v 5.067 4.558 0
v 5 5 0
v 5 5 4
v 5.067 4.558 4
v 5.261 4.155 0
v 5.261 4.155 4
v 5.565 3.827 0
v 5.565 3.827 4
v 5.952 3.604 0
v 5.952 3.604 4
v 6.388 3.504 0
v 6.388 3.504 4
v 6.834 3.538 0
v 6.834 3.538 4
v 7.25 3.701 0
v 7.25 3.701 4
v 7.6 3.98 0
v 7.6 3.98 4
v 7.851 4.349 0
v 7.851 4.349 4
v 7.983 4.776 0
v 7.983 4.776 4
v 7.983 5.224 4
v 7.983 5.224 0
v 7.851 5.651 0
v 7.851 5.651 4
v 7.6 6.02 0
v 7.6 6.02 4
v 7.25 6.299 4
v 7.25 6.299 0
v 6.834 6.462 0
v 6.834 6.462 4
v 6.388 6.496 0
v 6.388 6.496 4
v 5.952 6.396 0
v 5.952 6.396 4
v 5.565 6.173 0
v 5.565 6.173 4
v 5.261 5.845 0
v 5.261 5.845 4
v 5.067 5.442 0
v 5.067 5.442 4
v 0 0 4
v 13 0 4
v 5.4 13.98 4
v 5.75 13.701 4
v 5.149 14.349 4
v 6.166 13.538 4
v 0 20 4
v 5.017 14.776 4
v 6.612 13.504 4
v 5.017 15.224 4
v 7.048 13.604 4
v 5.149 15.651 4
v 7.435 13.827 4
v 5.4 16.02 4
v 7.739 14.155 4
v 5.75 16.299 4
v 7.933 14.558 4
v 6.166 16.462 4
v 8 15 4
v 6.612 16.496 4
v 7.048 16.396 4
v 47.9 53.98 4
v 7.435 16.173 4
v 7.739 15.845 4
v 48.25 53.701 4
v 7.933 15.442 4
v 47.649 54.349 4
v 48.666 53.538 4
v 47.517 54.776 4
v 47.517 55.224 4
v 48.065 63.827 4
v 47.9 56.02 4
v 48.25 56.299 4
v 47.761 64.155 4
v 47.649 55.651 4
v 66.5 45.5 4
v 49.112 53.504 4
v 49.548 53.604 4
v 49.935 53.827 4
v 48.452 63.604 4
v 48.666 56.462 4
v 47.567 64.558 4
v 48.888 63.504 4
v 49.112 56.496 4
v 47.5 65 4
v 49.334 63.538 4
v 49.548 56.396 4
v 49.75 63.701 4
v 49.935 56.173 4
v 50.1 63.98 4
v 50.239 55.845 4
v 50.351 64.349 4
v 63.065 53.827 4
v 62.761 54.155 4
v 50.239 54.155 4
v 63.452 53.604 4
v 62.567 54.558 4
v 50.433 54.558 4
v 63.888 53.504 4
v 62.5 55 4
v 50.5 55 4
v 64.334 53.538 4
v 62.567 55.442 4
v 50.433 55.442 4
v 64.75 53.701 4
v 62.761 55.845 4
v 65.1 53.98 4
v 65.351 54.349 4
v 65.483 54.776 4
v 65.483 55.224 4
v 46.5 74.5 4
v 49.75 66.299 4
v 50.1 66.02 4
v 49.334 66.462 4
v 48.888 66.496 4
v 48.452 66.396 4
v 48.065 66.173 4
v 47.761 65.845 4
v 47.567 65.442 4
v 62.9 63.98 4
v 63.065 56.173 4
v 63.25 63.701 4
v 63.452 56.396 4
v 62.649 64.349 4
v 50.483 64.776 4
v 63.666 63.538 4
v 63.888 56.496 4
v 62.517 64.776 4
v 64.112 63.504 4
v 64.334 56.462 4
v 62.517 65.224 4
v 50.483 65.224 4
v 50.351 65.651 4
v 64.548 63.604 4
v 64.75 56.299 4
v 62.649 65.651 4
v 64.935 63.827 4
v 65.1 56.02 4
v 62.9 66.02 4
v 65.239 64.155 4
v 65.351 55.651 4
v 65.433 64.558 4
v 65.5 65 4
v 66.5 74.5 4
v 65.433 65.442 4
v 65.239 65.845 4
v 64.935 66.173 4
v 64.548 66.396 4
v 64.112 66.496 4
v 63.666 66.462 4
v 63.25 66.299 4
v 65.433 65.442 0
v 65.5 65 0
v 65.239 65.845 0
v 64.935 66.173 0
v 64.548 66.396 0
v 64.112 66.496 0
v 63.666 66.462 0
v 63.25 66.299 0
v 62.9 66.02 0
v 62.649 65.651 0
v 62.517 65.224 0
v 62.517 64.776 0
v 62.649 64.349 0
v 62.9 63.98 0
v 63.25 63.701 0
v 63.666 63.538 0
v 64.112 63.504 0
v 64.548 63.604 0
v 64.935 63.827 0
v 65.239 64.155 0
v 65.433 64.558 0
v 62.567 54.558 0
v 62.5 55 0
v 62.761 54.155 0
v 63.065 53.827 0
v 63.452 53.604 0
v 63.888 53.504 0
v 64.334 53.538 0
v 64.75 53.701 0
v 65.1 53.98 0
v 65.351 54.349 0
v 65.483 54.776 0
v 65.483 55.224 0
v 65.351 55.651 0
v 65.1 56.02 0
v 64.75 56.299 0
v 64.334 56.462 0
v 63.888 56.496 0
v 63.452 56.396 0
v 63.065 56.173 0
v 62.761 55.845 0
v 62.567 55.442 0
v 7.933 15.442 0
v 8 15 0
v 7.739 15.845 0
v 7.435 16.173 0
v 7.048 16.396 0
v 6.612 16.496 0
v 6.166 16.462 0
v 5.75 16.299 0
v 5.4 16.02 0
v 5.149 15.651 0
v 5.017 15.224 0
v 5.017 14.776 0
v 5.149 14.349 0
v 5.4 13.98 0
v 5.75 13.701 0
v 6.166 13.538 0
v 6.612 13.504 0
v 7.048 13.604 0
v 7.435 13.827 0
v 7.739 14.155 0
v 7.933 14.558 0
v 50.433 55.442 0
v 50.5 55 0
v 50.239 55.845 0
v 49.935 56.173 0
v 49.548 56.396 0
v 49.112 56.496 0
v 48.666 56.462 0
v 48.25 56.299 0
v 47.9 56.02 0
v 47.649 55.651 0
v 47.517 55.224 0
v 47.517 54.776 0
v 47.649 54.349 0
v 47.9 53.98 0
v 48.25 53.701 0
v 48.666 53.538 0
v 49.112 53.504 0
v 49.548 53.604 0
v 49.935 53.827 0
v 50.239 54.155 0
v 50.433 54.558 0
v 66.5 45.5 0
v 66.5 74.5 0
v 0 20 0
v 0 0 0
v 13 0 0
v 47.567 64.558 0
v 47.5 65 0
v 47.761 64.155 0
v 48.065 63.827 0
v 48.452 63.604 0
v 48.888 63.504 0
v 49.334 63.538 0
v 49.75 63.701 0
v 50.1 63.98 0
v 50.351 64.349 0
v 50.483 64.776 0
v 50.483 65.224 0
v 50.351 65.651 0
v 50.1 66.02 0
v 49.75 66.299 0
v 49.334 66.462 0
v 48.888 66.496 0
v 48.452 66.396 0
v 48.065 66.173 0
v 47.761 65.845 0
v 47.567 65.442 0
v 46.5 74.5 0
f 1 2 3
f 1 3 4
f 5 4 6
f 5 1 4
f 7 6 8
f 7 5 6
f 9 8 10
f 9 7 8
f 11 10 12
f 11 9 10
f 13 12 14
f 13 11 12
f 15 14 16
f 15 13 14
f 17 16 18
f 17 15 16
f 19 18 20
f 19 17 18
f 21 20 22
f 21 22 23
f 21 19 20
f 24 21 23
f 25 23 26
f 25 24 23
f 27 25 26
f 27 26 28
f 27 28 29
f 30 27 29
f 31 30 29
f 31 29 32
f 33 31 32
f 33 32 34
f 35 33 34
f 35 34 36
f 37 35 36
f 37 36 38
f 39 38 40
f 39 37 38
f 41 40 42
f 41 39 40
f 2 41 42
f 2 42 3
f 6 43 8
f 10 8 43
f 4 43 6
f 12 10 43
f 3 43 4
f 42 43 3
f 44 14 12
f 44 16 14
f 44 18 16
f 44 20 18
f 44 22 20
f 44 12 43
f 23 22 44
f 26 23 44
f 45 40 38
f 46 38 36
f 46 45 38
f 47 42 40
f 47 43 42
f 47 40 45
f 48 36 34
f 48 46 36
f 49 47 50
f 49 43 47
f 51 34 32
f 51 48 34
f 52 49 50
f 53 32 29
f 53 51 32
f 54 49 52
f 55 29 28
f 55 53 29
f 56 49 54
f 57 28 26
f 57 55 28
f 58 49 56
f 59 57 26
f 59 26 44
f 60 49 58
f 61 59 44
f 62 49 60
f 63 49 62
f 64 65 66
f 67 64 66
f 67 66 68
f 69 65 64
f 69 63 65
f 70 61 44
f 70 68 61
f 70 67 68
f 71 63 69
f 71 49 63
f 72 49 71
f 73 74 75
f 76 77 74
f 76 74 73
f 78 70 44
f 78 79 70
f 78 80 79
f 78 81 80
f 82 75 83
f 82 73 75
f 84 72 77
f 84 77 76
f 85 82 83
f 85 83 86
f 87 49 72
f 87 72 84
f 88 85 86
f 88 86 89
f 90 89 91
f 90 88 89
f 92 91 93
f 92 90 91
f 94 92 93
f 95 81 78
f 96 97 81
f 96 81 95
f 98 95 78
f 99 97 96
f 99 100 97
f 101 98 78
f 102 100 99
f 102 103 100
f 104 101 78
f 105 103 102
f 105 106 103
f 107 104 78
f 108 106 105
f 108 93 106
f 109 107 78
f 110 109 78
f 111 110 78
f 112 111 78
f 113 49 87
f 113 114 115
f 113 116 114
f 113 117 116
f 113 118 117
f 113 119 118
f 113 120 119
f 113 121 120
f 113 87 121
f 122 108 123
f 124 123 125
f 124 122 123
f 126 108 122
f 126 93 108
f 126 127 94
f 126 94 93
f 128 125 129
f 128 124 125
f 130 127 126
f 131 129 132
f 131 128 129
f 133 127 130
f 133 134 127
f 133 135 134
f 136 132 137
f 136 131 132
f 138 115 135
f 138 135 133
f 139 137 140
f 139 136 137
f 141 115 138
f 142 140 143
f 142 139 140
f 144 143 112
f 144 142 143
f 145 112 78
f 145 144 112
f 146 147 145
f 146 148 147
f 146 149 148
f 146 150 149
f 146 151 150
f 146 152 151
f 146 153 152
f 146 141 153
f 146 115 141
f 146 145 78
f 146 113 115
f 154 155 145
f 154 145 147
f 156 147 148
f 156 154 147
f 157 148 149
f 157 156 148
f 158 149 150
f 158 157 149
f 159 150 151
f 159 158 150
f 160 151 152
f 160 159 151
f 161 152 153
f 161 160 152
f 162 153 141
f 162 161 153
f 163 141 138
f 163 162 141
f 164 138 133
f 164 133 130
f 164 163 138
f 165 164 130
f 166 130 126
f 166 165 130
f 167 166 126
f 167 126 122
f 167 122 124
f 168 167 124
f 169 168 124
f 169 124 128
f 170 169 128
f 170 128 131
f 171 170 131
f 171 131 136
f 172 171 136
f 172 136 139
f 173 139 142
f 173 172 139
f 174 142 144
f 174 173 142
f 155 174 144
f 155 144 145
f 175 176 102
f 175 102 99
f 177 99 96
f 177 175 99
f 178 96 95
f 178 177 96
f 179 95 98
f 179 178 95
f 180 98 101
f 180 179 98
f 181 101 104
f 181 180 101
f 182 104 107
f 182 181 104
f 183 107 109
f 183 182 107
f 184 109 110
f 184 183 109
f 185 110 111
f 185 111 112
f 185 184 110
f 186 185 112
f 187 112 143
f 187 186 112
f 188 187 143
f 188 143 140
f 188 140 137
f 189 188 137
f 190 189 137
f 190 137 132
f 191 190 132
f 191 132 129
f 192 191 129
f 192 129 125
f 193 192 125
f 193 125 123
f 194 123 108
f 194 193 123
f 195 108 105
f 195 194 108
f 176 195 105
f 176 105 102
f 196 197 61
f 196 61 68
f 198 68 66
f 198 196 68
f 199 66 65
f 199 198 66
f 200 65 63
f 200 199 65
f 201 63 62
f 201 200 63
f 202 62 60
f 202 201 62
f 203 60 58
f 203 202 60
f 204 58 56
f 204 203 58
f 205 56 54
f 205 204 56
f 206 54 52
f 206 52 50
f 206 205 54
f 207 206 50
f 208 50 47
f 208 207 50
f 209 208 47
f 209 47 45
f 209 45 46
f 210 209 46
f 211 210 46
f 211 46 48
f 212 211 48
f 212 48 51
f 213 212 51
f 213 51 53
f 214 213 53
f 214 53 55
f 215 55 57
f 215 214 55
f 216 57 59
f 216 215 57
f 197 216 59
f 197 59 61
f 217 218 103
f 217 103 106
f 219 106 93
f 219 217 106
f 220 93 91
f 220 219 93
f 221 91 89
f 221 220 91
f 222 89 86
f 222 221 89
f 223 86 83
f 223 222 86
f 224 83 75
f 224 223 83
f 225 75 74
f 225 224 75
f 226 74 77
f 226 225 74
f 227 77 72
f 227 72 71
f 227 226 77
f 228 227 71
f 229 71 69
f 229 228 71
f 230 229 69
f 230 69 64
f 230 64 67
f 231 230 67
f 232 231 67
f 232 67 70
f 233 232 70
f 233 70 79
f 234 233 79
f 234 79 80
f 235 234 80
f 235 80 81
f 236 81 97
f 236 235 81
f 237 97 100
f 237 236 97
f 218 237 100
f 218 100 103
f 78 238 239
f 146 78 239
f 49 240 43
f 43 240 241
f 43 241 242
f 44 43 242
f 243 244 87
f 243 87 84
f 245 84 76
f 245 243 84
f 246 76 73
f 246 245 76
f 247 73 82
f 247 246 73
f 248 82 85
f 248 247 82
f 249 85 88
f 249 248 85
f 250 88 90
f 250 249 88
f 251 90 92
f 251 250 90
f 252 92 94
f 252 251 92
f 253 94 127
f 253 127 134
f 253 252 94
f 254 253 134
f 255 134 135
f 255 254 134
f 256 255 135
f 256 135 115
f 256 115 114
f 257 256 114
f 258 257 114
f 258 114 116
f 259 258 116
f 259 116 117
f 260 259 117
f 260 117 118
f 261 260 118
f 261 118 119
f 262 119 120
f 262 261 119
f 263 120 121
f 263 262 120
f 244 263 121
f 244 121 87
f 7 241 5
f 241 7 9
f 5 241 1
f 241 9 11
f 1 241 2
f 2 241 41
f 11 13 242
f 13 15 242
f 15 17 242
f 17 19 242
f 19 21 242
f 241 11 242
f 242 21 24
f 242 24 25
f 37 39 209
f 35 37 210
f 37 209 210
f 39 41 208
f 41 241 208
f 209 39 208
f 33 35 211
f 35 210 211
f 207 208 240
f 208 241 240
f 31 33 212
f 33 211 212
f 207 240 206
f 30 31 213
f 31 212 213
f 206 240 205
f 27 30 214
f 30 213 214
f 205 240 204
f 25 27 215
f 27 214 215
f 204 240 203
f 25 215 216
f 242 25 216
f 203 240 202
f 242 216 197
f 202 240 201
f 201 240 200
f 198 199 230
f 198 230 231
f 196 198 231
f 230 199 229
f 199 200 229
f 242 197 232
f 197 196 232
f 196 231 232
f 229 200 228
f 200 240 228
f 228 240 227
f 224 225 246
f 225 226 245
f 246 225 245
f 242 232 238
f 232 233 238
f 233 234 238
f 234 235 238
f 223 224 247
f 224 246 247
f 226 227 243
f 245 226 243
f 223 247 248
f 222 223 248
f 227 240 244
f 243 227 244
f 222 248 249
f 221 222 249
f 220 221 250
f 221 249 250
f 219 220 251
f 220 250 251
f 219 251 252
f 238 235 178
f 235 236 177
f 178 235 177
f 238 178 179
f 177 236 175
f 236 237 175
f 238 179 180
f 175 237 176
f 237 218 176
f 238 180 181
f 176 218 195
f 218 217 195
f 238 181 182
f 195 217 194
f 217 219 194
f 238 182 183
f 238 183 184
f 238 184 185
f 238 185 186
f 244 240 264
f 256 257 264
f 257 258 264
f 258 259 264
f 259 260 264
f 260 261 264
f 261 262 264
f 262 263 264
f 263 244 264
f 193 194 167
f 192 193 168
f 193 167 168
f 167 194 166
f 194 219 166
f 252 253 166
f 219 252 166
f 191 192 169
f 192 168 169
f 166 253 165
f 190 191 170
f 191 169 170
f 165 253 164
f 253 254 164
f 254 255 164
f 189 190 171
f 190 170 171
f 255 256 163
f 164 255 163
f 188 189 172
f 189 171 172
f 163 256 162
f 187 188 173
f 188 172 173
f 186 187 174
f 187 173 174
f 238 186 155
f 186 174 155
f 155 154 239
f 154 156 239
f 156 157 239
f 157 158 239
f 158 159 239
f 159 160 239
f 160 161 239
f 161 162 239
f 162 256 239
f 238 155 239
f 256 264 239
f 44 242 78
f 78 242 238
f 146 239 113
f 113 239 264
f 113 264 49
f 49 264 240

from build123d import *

# Parameters (mm, degrees)
SKETCH_1_R      = 1.5
EXTRUDE_1_DEPTH = 4


with BuildPart() as part:
    # 草图1 → 凸台-拉伸1 (new body)
    with BuildSketch(Plane.XY):
        Polygon((0, 0), (13, 0), (66.5, 45.5), (66.5, 74.5), (46.5, 74.5), (0, 20), align=None)
        with Locations((6.5, 15)):
            Circle(SKETCH_1_R, mode=Mode.SUBTRACT)
        with Locations(Location((6.5, 5, 0), (0, 0, 180))):
            Circle(SKETCH_1_R, mode=Mode.SUBTRACT)
        with Locations((49, 55)):
            Circle(SKETCH_1_R, mode=Mode.SUBTRACT)
        with Locations(Location((64, 55, 0), (0, 0, 180))):
            Circle(SKETCH_1_R, mode=Mode.SUBTRACT)
        with Locations(Location((49, 65, 0), (0, 0, 180))):
            Circle(SKETCH_1_R, mode=Mode.SUBTRACT)
        with Locations((64, 65)):
            Circle(SKETCH_1_R, mode=Mode.SUBTRACT)
    extrude(amount=EXTRUDE_1_DEPTH)


solid = part.part
